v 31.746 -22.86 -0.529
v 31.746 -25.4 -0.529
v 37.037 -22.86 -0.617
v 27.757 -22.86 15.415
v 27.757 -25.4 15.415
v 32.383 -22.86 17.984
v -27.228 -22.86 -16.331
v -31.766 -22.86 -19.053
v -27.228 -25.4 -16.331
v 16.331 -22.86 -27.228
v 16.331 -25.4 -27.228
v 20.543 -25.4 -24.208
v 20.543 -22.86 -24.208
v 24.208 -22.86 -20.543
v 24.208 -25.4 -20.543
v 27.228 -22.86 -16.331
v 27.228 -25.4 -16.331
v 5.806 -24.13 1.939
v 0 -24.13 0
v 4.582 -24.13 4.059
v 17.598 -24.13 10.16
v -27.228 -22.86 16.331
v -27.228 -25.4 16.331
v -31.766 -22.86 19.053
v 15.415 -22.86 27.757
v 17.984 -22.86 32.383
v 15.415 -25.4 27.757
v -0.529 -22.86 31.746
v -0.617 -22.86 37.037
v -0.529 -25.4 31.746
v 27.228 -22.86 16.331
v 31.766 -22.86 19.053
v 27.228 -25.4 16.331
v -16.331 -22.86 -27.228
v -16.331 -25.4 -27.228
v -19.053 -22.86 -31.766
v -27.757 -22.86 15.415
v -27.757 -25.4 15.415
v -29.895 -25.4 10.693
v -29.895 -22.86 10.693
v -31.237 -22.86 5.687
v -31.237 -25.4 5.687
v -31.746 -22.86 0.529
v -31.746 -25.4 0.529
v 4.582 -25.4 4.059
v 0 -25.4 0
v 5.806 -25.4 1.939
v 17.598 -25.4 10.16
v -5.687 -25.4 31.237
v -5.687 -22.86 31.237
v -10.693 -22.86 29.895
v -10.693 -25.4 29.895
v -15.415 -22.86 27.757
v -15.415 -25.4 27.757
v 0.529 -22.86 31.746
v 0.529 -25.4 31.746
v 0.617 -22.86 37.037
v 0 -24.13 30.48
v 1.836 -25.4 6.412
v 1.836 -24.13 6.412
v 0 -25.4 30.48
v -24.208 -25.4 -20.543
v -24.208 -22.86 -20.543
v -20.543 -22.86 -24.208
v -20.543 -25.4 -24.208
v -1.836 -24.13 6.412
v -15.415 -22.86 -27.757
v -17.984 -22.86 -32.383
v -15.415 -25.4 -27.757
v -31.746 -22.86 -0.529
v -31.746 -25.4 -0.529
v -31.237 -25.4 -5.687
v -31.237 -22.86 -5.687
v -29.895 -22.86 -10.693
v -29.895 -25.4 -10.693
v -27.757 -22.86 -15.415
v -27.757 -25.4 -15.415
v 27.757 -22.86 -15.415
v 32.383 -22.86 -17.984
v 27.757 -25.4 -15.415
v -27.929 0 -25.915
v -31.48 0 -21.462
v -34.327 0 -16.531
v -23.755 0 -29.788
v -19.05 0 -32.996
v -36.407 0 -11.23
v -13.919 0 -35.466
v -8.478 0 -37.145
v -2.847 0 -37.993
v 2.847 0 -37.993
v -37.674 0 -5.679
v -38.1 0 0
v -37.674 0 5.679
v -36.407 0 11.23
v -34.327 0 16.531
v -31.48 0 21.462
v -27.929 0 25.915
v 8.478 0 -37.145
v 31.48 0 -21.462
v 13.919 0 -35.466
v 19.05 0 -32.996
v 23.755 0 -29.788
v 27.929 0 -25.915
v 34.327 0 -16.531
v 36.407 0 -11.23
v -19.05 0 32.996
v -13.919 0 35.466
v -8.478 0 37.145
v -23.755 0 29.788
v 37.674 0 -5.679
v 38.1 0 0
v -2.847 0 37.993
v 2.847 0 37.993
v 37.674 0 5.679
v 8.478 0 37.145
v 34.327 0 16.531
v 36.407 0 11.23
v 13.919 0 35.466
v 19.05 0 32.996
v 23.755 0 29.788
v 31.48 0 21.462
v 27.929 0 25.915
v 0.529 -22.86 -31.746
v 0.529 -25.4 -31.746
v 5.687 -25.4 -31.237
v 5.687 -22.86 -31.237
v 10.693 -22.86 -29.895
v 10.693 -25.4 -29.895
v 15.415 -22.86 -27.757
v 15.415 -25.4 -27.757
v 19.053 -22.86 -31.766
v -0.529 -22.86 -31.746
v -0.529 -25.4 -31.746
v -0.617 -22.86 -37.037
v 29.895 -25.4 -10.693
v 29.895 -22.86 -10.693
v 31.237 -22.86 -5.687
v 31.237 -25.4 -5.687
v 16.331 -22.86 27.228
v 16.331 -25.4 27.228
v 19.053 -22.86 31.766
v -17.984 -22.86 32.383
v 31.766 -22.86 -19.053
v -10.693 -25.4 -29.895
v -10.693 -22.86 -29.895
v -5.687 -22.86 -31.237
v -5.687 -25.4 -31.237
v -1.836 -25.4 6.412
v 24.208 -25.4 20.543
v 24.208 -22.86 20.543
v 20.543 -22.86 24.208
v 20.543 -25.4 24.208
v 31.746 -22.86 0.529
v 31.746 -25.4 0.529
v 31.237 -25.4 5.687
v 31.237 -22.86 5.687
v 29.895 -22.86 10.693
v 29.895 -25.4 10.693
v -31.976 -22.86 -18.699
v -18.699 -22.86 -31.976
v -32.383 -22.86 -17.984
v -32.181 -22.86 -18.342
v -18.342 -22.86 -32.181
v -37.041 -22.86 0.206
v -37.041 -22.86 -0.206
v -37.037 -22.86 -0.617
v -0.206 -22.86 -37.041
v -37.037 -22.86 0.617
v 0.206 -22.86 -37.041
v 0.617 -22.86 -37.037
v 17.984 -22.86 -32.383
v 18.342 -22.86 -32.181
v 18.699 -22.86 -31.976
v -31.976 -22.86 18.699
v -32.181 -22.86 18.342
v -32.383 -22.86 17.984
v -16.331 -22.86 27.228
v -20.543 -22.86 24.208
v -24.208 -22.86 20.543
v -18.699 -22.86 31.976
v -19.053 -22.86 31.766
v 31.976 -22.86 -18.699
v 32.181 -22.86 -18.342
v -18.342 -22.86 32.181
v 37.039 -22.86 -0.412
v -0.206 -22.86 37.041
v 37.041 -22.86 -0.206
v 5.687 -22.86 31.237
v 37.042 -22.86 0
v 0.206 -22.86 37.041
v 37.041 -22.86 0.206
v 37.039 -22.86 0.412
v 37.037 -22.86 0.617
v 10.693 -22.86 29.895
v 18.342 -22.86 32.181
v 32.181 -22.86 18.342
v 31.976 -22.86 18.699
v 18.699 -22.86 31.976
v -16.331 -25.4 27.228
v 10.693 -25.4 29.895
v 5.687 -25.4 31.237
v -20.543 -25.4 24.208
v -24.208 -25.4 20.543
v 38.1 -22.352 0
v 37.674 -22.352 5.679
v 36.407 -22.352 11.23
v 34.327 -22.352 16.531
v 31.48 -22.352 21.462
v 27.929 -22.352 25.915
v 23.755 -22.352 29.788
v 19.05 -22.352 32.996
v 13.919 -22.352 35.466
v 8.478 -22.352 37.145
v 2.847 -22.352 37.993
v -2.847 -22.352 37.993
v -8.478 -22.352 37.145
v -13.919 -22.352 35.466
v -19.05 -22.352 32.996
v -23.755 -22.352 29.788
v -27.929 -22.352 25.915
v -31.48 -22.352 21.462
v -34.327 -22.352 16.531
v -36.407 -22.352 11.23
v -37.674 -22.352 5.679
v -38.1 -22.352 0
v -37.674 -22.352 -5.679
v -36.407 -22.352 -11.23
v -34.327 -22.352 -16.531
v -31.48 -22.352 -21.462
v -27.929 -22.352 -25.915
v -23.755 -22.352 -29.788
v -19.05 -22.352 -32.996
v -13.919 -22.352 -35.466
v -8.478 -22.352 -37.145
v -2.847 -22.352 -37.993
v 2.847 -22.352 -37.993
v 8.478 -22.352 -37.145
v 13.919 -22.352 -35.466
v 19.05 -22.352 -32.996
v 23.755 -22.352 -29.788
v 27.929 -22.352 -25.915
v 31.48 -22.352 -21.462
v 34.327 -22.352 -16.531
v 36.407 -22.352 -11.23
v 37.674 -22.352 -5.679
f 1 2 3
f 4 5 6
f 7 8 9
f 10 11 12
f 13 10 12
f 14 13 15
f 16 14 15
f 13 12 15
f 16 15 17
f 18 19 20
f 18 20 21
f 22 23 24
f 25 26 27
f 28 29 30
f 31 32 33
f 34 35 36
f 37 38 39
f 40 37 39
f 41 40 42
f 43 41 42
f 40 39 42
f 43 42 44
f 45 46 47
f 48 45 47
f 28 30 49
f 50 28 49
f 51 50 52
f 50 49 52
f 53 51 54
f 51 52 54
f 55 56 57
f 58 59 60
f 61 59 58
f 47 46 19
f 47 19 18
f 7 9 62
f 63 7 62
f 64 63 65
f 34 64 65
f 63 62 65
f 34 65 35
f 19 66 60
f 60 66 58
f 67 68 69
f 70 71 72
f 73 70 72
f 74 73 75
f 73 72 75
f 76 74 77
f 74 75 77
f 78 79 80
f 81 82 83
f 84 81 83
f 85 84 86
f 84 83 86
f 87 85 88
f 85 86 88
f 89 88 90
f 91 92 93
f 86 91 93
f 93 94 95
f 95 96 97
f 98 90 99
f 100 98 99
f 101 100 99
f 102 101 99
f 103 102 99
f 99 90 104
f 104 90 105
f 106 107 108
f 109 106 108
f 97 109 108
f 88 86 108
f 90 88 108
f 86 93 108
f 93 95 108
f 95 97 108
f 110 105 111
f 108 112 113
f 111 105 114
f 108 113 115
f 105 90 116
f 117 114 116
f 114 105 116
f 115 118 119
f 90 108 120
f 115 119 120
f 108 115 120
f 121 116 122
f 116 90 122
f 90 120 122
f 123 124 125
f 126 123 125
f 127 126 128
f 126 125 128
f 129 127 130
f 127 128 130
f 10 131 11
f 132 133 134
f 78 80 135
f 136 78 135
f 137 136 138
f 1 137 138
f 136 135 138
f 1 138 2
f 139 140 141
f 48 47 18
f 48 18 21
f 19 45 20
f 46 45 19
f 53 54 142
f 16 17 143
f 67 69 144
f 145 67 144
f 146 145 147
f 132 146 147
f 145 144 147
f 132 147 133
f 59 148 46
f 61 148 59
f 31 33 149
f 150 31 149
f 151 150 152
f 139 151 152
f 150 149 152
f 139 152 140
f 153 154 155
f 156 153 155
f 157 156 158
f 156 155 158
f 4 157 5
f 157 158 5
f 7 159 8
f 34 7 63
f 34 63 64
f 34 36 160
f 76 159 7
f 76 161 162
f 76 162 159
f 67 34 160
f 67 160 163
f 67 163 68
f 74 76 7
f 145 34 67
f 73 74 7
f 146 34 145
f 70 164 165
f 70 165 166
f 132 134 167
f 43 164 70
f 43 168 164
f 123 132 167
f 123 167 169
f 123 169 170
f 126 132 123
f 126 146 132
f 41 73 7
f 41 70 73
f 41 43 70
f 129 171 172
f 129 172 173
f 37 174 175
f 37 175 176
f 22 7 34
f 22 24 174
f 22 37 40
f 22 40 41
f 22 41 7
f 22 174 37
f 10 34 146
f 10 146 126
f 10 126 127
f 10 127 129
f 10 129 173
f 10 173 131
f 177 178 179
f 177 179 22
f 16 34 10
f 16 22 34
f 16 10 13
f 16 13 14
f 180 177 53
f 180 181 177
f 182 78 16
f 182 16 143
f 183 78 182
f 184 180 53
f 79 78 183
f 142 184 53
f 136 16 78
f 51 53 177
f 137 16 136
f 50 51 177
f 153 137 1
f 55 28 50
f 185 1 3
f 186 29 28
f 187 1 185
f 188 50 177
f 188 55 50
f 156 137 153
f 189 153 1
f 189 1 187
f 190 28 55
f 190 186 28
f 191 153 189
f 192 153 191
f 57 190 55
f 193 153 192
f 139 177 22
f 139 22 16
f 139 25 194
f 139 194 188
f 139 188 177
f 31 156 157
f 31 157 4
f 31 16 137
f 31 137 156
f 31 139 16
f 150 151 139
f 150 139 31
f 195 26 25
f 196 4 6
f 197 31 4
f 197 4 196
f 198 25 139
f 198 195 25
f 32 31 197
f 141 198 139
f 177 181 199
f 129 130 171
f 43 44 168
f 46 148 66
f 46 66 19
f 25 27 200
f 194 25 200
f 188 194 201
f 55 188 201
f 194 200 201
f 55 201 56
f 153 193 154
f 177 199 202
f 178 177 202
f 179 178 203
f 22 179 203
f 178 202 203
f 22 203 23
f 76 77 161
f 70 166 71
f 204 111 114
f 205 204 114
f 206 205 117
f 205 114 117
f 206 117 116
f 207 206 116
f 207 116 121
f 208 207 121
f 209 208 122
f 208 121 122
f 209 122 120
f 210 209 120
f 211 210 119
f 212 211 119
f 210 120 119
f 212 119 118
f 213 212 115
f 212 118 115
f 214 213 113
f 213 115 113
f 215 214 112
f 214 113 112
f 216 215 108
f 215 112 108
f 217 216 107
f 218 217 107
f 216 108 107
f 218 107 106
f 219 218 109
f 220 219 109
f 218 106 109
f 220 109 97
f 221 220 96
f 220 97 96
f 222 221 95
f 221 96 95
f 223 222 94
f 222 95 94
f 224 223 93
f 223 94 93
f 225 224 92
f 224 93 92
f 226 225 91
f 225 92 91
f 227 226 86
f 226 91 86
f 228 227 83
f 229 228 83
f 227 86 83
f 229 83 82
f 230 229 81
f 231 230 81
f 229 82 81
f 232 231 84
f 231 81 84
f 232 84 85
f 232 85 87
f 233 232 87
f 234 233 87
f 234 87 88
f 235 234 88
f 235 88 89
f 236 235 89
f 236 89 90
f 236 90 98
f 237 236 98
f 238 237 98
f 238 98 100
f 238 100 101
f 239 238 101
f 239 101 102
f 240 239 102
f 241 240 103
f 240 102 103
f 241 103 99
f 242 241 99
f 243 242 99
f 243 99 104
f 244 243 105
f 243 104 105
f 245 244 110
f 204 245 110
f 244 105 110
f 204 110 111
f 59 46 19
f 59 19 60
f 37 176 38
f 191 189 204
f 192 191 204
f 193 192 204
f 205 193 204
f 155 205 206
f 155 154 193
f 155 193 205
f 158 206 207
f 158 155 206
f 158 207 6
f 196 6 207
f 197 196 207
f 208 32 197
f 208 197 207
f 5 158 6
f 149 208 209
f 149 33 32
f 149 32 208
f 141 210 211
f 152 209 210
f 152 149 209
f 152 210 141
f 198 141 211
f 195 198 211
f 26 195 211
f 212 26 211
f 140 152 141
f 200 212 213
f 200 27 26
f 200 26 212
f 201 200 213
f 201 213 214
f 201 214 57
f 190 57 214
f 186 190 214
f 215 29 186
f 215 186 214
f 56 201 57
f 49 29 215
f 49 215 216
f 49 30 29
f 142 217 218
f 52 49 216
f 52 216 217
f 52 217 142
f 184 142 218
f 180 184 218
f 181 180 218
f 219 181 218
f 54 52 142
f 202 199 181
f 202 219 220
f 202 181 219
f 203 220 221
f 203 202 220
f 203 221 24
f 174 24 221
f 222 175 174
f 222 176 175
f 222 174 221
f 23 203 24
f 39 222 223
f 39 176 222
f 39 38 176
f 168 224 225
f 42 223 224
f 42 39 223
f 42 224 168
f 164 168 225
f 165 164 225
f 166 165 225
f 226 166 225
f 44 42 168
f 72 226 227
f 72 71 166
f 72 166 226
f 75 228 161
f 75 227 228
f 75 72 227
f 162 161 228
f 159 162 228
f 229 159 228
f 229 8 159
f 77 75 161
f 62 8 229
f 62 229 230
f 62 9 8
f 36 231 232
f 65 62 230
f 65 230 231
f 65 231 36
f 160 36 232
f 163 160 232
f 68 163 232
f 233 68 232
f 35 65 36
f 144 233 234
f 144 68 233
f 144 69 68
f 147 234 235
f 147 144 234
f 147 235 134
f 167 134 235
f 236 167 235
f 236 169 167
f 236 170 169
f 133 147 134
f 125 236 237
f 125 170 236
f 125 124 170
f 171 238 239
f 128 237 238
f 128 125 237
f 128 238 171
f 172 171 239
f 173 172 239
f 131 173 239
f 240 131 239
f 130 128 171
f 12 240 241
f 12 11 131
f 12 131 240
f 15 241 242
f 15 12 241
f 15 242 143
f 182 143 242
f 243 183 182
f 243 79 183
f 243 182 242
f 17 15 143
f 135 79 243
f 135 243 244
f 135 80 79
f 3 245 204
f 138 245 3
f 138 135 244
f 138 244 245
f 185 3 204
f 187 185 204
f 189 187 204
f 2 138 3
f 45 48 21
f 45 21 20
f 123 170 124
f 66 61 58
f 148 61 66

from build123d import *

# Parameters (mm, degrees)
F0_R     = 38.1
F1_DEPTH = 25.4
F3_SIZE2 = 6.35
F3_SIZE  = 3.048
F4_DEPTH = 2.54
F6_DEPTH = 1.27


with BuildPart() as f1:
    # F0 (on Front) → F1 (new body)
    with BuildSketch(Plane.XZ):
        Circle(F0_R)
    extrude(amount=F1_DEPTH)

    # F3
    f3_edges = [f1.edges().sort_by_distance(p)[0] for p in [
        (-38.1, -25.4, 0),
    ]]
    f3_side = f1.faces().sort_by_distance((-38.1, -12.7, 0))[0]
    chamfer(f3_edges, length=F3_SIZE, length2=F3_SIZE2, reference=f3_side)

    # F2 (on face) → F4 (cut)
    with BuildSketch(Plane.XZ.offset(25.4)):
        with BuildLine():
            ThreePointArc((31.7455903799, -0.5291421686), (31.7488975758, -0.264580271), (31.75, 0))
            ThreePointArc((31.75, 0), (31.7488975758, 0.264580271), (31.7455903799, 0.5291421686))
            ThreePointArc((31.7455903799, 0.5291421686), (30.6681449847, 8.217504682), (27.7570588114, 15.4145446297))
            ThreePointArc((27.7570588114, 15.4145446297), (27.4963065702, 15.875), (27.2279166428, 16.3310457501))
            ThreePointArc((27.2279166428, 16.3310457501), (22.4506403027, 22.4506403027), (16.3310457501, 27.2279166428))
            ThreePointArc((16.3310457501, 27.2279166428), (15.875, 27.4963065702), (15.4145446297, 27.7570588114))
            ThreePointArc((15.4145446297, 27.7570588114), (8.217504682, 30.6681449847), (0.5291421686, 31.7455903799))
            ThreePointArc((0.5291421686, 31.7455903799), (0, 31.75), (-0.5291421686, 31.7455903799))
            ThreePointArc((-0.5291421686, 31.7455903799), (-8.217504682, 30.6681449847), (-15.4145446297, 27.7570588114))
            ThreePointArc((-15.4145446297, 27.7570588114), (-15.875, 27.4963065702), (-16.3310457501, 27.2279166428))
            ThreePointArc((-16.3310457501, 27.2279166428), (-22.4506403027, 22.4506403027), (-27.2279166428, 16.3310457501))
            ThreePointArc((-27.2279166428, 16.3310457501), (-27.4963065702, 15.875), (-27.7570588114, 15.4145446297))
            ThreePointArc((-27.7570588114, 15.4145446297), (-30.6681449847, 8.217504682), (-31.7455903799, 0.5291421686))
            ThreePointArc((-31.7455903799, 0.5291421686), (-31.75, 0), (-31.7455903799, -0.5291421686))
            ThreePointArc((-31.7455903799, -0.5291421686), (-30.6681449847, -8.217504682), (-27.7570588114, -15.4145446297))
            ThreePointArc((-27.7570588114, -15.4145446297), (-27.4963065702, -15.875), (-27.2279166428, -16.3310457501))
            ThreePointArc((-27.2279166428, -16.3310457501), (-22.4506403027, -22.4506403027), (-16.3310457501, -27.2279166428))
            ThreePointArc((-16.3310457501, -27.2279166428), (-15.875, -27.4963065702), (-15.4145446297, -27.7570588114))
            ThreePointArc((-15.4145446297, -27.7570588114), (-8.217504682, -30.6681449847), (-0.5291421686, -31.7455903799))
            ThreePointArc((-0.5291421686, -31.7455903799), (0, -31.75), (0.5291421686, -31.7455903799))
            ThreePointArc((0.5291421686, -31.7455903799), (8.217504682, -30.6681449847), (15.4145446297, -27.7570588114))
            ThreePointArc((15.4145446297, -27.7570588114), (15.875, -27.4963065702), (16.3310457501, -27.2279166428))
            ThreePointArc((16.3310457501, -27.2279166428), (22.4506403027, -22.4506403027), (27.2279166428, -16.3310457501))
            ThreePointArc((27.2279166428, -16.3310457501), (27.4963065702, -15.875), (27.7570588114, -15.4145446297))
            ThreePointArc((27.7570588114, -15.4145446297), (30.6681449847, -8.217504682), (31.7455903799, -0.5291421686))
        make_face()
        with BuildLine():
            ThreePointArc((31.7455903799, 0.5291421686), (31.7488975758, 0.264580271), (31.75, 0))
            ThreePointArc((31.75, 0), (31.7488975758, -0.264580271), (31.7455903799, -0.5291421686))
            Line((31.7455903799, -0.5291421686), (38.0947084558, -0.6349706023))
            ThreePointArc((38.0947084558, -0.6349706023), (38.1, 0), (38.0947084558, 0.6349706023))
            Line((38.0947084558, 0.6349706023), (31.7455903799, 0.5291421686))
        make_face()
        with BuildLine():
            ThreePointArc((27.2279166428, 16.3310457501), (27.4963065702, 15.875), (27.7570588114, 15.4145446297))
            Line((27.7570588114, 15.4145446297), (33.3084705736, 18.4974535557))
            ThreePointArc((33.3084705736, 18.4974535557), (32.9955678842, 19.05), (32.6734999714, 19.5972549001))
            Line((32.6734999714, 19.5972549001), (27.2279166428, 16.3310457501))
        make_face()
        with BuildLine():
            Line((33.3084705736, -18.4974535557), (27.7570588114, -15.4145446297))
            ThreePointArc((27.7570588114, -15.4145446297), (27.4963065702, -15.875), (27.2279166428, -16.3310457501))
            Line((27.2279166428, -16.3310457501), (32.6734999714, -19.5972549001))
            ThreePointArc((32.6734999714, -19.5972549001), (32.9955678842, -19.05), (33.3084705736, -18.4974535557))
        make_face()
        with BuildLine():
            ThreePointArc((15.4145446297, 27.7570588114), (15.875, 27.4963065702), (16.3310457501, 27.2279166428))
            Line((16.3310457501, 27.2279166428), (19.5972549001, 32.6734999714))
            ThreePointArc((19.5972549001, 32.6734999714), (19.05, 32.9955678842), (18.4974535557, 33.3084705736))
            Line((18.4974535557, 33.3084705736), (15.4145446297, 27.7570588114))
        make_face()
        with BuildLine():
            Line((19.5972549001, -32.6734999714), (16.3310457501, -27.2279166428))
            ThreePointArc((16.3310457501, -27.2279166428), (15.875, -27.4963065702), (15.4145446297, -27.7570588114))
            Line((15.4145446297, -27.7570588114), (18.4974535557, -33.3084705736))
            ThreePointArc((18.4974535557, -33.3084705736), (19.05, -32.9955678842), (19.5972549001, -32.6734999714))
        make_face()
        with BuildLine():
            ThreePointArc((-0.5291421686, 31.7455903799), (0, 31.75), (0.5291421686, 31.7455903799))
            Line((0.5291421686, 31.7455903799), (0.6349706023, 38.0947084558))
            ThreePointArc((0.6349706023, 38.0947084558), (0, 38.1), (-0.6349706023, 38.0947084558))
            Line((-0.6349706023, 38.0947084558), (-0.5291421686, 31.7455903799))
        make_face()
        with BuildLine():
            Line((0.6349706023, -38.0947084558), (0.5291421686, -31.7455903799))
            ThreePointArc((0.5291421686, -31.7455903799), (0, -31.75), (-0.5291421686, -31.7455903799))
            Line((-0.5291421686, -31.7455903799), (-0.6349706023, -38.0947084558))
            ThreePointArc((-0.6349706023, -38.0947084558), (0, -38.1), (0.6349706023, -38.0947084558))
        make_face()
        with BuildLine():
            ThreePointArc((-16.3310457501, 27.2279166428), (-15.875, 27.4963065702), (-15.4145446297, 27.7570588114))
            Line((-15.4145446297, 27.7570588114), (-18.4974535557, 33.3084705736))
            ThreePointArc((-18.4974535557, 33.3084705736), (-19.05, 32.9955678842), (-19.5972549001, 32.6734999714))
            Line((-19.5972549001, 32.6734999714), (-16.3310457501, 27.2279166428))
        make_face()
        with BuildLine():
            Line((-18.4974535557, -33.3084705736), (-15.4145446297, -27.7570588114))
            ThreePointArc((-15.4145446297, -27.7570588114), (-15.875, -27.4963065702), (-16.3310457501, -27.2279166428))
            Line((-16.3310457501, -27.2279166428), (-19.5972549001, -32.6734999714))
            ThreePointArc((-19.5972549001, -32.6734999714), (-19.05, -32.9955678842), (-18.4974535557, -33.3084705736))
        make_face()
        with BuildLine():
            ThreePointArc((-27.7570588114, 15.4145446297), (-27.4963065702, 15.875), (-27.2279166428, 16.3310457501))
            Line((-27.2279166428, 16.3310457501), (-32.6734999714, 19.5972549001))
            ThreePointArc((-32.6734999714, 19.5972549001), (-32.9955678842, 19.05), (-33.3084705736, 18.4974535557))
            Line((-33.3084705736, 18.4974535557), (-27.7570588114, 15.4145446297))
        make_face()
        with BuildLine():
            Line((-32.6734999714, -19.5972549001), (-27.2279166428, -16.3310457501))
            ThreePointArc((-27.2279166428, -16.3310457501), (-27.4963065702, -15.875), (-27.7570588114, -15.4145446297))
            Line((-27.7570588114, -15.4145446297), (-33.3084705736, -18.4974535557))
            ThreePointArc((-33.3084705736, -18.4974535557), (-32.9955678842, -19.05), (-32.6734999714, -19.5972549001))
        make_face()
        with BuildLine():
            ThreePointArc((-31.7455903799, -0.5291421686), (-31.75, 0), (-31.7455903799, 0.5291421686))
            Line((-31.7455903799, 0.5291421686), (-38.0947084558, 0.6349706023))
            ThreePointArc((-38.0947084558, 0.6349706023), (-38.1, 0), (-38.0947084558, -0.6349706023))
            Line((-38.0947084558, -0.6349706023), (-31.7455903799, -0.5291421686))
        make_face()
    extrude(amount=-F4_DEPTH, mode=Mode.SUBTRACT)


with BuildPart() as f6:
    # F5 (on face) → F6 (new body)
    with BuildSketch(Plane.XZ.offset(25.4)):
        Polygon((1.8360100221, 6.4122295007), (0, 30.48), (-1.8360100221, 6.4122295007), (0, 0), align=None)
    extrude(amount=-F6_DEPTH)

    # F5 (on face) → F6, piece 2 (join)
    with BuildSketch(Plane.XZ.offset(25.4)):
        Polygon((4.5823035762, 4.0588481352), (0, 0), (5.8062173832, 1.9389672372), (17.5976362049, 10.16), align=None)
    extrude(amount=-F6_DEPTH)


solid = Compound([f1.part, f6.part])
